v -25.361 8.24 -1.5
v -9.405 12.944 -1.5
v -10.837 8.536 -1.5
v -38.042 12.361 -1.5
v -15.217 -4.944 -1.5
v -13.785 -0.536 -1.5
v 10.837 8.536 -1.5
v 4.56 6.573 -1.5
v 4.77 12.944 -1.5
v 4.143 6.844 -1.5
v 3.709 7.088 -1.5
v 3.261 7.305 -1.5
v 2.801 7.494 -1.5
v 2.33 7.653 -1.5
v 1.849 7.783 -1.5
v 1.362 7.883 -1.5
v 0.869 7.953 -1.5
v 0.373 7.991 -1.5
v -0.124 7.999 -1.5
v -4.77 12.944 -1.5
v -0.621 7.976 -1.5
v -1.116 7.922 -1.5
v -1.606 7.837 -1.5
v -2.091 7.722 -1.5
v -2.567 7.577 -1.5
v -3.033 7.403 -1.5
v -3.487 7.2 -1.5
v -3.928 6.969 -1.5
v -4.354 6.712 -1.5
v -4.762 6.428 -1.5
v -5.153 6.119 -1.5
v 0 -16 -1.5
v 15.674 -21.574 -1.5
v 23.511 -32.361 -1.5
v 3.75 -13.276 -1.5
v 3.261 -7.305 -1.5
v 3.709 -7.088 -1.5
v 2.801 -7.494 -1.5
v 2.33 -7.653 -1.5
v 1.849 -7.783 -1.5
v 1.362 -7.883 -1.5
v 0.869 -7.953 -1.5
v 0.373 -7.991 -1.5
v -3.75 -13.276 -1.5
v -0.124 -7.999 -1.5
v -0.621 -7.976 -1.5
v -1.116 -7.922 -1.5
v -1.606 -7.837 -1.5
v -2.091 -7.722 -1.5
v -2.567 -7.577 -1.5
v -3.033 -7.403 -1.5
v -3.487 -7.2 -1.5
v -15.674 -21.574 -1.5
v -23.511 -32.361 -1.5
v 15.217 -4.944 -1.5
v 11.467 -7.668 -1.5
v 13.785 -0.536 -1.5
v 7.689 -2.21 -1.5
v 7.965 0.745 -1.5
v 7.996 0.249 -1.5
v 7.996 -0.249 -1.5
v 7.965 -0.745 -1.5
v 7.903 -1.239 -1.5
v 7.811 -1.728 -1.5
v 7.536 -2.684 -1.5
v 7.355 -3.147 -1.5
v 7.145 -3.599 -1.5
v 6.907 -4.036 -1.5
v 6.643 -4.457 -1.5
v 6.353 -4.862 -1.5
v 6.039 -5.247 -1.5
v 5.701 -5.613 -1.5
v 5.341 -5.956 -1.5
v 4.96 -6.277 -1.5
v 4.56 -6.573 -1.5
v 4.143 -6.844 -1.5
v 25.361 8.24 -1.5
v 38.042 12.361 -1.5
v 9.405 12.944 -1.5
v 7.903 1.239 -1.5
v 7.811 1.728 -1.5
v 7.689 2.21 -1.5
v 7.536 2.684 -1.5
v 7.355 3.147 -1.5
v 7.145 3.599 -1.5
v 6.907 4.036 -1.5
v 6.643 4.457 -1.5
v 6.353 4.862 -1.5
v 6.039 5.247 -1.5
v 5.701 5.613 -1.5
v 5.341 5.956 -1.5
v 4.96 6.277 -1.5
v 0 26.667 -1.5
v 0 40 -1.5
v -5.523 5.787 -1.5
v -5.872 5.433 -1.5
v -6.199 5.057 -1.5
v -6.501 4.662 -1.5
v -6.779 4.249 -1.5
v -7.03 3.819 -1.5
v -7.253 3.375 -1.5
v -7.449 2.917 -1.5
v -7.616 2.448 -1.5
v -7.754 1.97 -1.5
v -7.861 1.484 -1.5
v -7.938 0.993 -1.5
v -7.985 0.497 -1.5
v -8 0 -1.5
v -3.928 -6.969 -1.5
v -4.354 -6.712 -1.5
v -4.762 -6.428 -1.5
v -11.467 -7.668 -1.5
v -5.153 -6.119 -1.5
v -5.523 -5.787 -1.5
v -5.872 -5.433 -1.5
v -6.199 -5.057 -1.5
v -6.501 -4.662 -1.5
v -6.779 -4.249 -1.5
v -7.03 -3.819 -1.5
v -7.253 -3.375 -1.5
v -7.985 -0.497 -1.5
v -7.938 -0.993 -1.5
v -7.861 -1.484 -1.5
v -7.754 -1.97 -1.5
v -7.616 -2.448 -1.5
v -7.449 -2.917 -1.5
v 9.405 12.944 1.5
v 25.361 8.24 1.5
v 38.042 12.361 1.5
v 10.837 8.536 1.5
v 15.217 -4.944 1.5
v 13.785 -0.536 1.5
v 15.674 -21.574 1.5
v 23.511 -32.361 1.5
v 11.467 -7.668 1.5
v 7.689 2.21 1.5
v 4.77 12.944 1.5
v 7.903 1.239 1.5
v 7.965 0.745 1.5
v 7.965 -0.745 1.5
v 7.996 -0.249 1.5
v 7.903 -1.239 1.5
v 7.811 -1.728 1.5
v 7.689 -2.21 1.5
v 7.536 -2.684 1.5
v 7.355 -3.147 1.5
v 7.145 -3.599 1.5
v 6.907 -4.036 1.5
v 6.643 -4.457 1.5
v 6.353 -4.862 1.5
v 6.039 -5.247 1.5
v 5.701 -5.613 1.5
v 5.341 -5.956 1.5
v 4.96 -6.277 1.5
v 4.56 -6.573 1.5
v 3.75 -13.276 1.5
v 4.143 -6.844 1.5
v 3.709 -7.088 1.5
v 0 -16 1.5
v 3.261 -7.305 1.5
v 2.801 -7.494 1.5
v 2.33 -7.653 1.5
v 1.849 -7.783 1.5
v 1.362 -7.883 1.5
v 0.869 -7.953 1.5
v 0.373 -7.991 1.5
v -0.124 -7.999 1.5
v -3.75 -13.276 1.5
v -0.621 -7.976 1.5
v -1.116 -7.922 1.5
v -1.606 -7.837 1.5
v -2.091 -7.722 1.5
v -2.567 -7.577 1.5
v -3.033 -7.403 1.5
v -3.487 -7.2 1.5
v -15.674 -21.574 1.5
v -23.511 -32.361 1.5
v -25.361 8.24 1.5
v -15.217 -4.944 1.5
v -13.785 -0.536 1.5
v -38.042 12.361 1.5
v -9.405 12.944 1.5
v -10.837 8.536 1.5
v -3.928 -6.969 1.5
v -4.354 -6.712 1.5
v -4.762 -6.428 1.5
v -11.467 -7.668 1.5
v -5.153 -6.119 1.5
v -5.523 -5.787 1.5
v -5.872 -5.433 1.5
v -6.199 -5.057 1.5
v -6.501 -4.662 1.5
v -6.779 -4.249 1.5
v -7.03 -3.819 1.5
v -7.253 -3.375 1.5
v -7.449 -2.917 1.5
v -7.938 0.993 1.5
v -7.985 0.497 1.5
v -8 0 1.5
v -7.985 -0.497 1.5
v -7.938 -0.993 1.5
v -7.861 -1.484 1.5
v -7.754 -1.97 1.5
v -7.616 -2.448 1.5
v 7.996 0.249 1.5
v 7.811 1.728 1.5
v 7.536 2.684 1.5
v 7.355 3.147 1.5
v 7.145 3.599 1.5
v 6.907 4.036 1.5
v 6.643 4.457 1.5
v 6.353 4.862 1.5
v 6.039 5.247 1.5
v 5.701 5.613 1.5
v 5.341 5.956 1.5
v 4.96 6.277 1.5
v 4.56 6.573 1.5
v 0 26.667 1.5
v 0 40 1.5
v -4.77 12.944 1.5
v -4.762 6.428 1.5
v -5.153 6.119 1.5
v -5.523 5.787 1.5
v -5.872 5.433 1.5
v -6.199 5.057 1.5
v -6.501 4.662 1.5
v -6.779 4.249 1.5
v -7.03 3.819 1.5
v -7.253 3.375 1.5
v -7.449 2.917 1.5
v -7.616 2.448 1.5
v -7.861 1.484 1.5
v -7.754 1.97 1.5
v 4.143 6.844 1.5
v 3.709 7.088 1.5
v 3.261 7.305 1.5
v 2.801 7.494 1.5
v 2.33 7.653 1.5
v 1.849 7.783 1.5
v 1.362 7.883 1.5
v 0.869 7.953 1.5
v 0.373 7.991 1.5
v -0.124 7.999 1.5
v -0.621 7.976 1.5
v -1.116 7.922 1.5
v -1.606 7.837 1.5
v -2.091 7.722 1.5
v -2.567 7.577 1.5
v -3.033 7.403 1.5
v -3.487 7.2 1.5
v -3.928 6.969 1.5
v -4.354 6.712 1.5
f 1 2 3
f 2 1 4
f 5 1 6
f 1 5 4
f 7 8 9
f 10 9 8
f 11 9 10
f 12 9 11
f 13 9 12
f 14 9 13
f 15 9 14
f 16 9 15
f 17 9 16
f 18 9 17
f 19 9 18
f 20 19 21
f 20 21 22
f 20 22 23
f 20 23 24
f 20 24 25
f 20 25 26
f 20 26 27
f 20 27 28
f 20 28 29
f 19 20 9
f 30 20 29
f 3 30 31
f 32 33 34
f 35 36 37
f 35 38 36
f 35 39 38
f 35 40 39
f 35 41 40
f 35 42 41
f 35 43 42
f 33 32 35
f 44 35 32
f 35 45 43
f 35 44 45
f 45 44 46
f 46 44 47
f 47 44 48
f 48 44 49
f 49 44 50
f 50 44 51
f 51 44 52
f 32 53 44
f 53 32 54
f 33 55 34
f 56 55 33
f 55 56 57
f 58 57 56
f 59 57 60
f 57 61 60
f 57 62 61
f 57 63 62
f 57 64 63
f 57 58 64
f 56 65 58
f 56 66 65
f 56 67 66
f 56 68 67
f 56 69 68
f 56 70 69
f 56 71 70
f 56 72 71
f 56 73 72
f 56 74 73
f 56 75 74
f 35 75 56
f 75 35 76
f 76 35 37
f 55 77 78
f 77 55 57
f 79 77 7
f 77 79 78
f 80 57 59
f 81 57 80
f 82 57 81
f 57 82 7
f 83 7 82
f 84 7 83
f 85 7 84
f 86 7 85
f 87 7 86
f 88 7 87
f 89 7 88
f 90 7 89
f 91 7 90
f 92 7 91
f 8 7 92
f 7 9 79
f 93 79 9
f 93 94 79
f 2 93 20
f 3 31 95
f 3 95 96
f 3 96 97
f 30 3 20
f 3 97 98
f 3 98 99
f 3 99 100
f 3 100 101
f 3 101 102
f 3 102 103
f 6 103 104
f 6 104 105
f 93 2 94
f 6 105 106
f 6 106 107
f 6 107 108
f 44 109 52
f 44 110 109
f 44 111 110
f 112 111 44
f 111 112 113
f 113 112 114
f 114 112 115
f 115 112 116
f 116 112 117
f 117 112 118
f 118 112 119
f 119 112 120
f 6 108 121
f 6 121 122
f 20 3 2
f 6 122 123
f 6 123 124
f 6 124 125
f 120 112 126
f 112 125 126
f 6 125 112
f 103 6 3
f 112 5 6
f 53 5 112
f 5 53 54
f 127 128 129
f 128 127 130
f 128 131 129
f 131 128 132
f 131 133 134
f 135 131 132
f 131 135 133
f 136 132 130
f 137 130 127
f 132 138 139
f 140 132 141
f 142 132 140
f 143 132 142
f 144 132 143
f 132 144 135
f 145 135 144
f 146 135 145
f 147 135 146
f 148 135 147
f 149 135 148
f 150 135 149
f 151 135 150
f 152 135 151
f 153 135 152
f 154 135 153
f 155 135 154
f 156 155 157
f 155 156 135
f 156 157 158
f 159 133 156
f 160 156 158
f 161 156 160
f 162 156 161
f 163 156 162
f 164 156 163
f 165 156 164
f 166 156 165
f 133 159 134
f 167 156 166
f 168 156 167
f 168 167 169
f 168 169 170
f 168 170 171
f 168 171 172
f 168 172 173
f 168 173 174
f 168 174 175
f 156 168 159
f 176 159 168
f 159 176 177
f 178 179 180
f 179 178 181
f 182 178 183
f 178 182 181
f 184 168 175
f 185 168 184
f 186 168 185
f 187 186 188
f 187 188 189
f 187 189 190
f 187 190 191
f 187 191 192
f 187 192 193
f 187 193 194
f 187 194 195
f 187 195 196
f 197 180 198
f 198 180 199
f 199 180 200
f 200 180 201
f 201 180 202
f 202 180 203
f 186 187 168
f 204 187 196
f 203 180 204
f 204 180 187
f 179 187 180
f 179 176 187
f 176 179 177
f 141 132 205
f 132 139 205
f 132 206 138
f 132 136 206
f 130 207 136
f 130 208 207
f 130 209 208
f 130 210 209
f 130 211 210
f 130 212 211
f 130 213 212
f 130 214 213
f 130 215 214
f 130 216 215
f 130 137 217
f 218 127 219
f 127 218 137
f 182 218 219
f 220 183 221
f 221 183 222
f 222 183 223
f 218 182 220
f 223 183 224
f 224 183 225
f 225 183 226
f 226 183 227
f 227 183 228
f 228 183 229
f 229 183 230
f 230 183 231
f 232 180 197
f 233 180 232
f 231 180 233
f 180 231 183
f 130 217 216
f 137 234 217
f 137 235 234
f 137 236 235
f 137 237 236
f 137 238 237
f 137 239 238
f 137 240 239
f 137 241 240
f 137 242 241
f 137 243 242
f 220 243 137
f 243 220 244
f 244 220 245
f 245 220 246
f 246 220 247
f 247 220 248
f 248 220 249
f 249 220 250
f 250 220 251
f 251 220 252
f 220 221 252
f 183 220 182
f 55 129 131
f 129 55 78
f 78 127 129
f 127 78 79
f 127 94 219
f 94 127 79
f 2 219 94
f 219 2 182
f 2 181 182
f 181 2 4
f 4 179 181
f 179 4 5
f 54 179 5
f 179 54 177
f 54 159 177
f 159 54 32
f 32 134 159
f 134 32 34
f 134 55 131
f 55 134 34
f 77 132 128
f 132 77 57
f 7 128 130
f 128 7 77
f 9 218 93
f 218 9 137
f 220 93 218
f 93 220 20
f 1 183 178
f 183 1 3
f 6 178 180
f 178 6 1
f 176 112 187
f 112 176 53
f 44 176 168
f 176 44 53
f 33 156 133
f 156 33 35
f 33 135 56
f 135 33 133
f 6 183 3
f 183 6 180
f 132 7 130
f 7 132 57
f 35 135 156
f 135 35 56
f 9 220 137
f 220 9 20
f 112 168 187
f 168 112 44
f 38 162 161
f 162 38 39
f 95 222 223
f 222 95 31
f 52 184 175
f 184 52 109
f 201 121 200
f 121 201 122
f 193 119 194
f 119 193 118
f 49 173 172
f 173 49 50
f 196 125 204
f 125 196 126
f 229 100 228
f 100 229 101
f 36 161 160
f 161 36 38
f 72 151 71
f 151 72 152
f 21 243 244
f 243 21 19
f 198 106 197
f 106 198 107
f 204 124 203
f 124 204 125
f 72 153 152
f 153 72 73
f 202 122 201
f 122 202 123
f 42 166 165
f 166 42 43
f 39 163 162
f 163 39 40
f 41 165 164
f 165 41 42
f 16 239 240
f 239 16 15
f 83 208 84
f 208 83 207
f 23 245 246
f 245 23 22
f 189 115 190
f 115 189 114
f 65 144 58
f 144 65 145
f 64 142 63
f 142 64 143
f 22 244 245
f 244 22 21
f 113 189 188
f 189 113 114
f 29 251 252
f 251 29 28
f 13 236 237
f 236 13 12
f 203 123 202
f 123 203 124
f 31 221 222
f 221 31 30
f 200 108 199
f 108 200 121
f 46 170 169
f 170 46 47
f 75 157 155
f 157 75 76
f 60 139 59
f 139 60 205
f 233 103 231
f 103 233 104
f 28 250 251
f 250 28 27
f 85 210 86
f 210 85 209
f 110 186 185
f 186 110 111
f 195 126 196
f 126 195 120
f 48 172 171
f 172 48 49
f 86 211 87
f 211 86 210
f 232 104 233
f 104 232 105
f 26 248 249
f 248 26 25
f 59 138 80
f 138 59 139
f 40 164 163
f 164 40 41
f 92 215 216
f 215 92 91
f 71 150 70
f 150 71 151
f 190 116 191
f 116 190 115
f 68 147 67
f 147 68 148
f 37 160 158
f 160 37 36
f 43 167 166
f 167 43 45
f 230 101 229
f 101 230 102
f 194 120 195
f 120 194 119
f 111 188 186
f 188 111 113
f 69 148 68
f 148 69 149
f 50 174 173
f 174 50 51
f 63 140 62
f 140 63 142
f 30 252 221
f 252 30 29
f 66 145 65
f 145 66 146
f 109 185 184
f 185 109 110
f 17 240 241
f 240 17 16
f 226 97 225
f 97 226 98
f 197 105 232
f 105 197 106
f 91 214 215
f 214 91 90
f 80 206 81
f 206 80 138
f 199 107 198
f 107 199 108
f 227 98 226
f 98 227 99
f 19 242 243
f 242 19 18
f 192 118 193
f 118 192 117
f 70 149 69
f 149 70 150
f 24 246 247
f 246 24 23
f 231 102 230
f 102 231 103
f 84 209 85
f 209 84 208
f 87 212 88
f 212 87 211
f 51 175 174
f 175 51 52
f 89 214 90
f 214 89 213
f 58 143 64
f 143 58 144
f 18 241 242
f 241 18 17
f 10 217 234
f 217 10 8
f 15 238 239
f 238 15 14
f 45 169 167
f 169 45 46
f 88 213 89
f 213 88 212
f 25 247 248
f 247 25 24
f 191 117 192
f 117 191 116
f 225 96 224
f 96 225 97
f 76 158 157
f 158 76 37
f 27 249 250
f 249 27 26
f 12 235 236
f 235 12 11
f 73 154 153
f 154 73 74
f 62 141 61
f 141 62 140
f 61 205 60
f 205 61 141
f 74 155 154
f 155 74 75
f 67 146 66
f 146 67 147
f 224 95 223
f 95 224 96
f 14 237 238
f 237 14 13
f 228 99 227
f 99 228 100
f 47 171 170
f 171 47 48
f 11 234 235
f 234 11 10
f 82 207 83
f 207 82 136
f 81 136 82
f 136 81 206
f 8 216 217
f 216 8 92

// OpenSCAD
/**
 * Samples using the camelSCAD library.
 *
 * A parametric christmas star.
 *
 * @author jsconan
 * @license CC0-1.0
 */

// As we need to use some shapes, use the right entry point of the library
use <../shapes.scad>

// We will render the object using the specifications of this mode
renderMode = "prod";

// Defines the dimensions of the star
radius = 40;
thickness = 3;
holeDiameter = 4;
ringThickness = 2;
ringDiameter = holeDiameter + ringThickness * 2;
coreRadius = (radius * 2) * (1 - 3 / 5);

// Sets the minimum facet angle and size using the defined render mode.
$fa = facetAngle(renderMode);
$fs = facetSize(renderMode);

// And draw the star
union() {
    // This is the frame of the star
    difference() {
        starBox(size=radius, h=thickness, edges=5, center=true);
        starBox(size=radius / 1.5, h=thickness + 1, edges=5, center=true);
    }
    // This is the core of the star
    rotateZ(180) {
        difference() {
            regularPolygonBox(size=coreRadius, n=5, h=thickness, center=true);
            cylinder(r=radius / 5, h=thickness + 1, center=true);
        }
    }
    // This the ring to hook the star
    translate([0, radius + ringThickness]) {
        pipe(d=ringDiameter, w=ringThickness, h=thickness, center=true);
    }
}
